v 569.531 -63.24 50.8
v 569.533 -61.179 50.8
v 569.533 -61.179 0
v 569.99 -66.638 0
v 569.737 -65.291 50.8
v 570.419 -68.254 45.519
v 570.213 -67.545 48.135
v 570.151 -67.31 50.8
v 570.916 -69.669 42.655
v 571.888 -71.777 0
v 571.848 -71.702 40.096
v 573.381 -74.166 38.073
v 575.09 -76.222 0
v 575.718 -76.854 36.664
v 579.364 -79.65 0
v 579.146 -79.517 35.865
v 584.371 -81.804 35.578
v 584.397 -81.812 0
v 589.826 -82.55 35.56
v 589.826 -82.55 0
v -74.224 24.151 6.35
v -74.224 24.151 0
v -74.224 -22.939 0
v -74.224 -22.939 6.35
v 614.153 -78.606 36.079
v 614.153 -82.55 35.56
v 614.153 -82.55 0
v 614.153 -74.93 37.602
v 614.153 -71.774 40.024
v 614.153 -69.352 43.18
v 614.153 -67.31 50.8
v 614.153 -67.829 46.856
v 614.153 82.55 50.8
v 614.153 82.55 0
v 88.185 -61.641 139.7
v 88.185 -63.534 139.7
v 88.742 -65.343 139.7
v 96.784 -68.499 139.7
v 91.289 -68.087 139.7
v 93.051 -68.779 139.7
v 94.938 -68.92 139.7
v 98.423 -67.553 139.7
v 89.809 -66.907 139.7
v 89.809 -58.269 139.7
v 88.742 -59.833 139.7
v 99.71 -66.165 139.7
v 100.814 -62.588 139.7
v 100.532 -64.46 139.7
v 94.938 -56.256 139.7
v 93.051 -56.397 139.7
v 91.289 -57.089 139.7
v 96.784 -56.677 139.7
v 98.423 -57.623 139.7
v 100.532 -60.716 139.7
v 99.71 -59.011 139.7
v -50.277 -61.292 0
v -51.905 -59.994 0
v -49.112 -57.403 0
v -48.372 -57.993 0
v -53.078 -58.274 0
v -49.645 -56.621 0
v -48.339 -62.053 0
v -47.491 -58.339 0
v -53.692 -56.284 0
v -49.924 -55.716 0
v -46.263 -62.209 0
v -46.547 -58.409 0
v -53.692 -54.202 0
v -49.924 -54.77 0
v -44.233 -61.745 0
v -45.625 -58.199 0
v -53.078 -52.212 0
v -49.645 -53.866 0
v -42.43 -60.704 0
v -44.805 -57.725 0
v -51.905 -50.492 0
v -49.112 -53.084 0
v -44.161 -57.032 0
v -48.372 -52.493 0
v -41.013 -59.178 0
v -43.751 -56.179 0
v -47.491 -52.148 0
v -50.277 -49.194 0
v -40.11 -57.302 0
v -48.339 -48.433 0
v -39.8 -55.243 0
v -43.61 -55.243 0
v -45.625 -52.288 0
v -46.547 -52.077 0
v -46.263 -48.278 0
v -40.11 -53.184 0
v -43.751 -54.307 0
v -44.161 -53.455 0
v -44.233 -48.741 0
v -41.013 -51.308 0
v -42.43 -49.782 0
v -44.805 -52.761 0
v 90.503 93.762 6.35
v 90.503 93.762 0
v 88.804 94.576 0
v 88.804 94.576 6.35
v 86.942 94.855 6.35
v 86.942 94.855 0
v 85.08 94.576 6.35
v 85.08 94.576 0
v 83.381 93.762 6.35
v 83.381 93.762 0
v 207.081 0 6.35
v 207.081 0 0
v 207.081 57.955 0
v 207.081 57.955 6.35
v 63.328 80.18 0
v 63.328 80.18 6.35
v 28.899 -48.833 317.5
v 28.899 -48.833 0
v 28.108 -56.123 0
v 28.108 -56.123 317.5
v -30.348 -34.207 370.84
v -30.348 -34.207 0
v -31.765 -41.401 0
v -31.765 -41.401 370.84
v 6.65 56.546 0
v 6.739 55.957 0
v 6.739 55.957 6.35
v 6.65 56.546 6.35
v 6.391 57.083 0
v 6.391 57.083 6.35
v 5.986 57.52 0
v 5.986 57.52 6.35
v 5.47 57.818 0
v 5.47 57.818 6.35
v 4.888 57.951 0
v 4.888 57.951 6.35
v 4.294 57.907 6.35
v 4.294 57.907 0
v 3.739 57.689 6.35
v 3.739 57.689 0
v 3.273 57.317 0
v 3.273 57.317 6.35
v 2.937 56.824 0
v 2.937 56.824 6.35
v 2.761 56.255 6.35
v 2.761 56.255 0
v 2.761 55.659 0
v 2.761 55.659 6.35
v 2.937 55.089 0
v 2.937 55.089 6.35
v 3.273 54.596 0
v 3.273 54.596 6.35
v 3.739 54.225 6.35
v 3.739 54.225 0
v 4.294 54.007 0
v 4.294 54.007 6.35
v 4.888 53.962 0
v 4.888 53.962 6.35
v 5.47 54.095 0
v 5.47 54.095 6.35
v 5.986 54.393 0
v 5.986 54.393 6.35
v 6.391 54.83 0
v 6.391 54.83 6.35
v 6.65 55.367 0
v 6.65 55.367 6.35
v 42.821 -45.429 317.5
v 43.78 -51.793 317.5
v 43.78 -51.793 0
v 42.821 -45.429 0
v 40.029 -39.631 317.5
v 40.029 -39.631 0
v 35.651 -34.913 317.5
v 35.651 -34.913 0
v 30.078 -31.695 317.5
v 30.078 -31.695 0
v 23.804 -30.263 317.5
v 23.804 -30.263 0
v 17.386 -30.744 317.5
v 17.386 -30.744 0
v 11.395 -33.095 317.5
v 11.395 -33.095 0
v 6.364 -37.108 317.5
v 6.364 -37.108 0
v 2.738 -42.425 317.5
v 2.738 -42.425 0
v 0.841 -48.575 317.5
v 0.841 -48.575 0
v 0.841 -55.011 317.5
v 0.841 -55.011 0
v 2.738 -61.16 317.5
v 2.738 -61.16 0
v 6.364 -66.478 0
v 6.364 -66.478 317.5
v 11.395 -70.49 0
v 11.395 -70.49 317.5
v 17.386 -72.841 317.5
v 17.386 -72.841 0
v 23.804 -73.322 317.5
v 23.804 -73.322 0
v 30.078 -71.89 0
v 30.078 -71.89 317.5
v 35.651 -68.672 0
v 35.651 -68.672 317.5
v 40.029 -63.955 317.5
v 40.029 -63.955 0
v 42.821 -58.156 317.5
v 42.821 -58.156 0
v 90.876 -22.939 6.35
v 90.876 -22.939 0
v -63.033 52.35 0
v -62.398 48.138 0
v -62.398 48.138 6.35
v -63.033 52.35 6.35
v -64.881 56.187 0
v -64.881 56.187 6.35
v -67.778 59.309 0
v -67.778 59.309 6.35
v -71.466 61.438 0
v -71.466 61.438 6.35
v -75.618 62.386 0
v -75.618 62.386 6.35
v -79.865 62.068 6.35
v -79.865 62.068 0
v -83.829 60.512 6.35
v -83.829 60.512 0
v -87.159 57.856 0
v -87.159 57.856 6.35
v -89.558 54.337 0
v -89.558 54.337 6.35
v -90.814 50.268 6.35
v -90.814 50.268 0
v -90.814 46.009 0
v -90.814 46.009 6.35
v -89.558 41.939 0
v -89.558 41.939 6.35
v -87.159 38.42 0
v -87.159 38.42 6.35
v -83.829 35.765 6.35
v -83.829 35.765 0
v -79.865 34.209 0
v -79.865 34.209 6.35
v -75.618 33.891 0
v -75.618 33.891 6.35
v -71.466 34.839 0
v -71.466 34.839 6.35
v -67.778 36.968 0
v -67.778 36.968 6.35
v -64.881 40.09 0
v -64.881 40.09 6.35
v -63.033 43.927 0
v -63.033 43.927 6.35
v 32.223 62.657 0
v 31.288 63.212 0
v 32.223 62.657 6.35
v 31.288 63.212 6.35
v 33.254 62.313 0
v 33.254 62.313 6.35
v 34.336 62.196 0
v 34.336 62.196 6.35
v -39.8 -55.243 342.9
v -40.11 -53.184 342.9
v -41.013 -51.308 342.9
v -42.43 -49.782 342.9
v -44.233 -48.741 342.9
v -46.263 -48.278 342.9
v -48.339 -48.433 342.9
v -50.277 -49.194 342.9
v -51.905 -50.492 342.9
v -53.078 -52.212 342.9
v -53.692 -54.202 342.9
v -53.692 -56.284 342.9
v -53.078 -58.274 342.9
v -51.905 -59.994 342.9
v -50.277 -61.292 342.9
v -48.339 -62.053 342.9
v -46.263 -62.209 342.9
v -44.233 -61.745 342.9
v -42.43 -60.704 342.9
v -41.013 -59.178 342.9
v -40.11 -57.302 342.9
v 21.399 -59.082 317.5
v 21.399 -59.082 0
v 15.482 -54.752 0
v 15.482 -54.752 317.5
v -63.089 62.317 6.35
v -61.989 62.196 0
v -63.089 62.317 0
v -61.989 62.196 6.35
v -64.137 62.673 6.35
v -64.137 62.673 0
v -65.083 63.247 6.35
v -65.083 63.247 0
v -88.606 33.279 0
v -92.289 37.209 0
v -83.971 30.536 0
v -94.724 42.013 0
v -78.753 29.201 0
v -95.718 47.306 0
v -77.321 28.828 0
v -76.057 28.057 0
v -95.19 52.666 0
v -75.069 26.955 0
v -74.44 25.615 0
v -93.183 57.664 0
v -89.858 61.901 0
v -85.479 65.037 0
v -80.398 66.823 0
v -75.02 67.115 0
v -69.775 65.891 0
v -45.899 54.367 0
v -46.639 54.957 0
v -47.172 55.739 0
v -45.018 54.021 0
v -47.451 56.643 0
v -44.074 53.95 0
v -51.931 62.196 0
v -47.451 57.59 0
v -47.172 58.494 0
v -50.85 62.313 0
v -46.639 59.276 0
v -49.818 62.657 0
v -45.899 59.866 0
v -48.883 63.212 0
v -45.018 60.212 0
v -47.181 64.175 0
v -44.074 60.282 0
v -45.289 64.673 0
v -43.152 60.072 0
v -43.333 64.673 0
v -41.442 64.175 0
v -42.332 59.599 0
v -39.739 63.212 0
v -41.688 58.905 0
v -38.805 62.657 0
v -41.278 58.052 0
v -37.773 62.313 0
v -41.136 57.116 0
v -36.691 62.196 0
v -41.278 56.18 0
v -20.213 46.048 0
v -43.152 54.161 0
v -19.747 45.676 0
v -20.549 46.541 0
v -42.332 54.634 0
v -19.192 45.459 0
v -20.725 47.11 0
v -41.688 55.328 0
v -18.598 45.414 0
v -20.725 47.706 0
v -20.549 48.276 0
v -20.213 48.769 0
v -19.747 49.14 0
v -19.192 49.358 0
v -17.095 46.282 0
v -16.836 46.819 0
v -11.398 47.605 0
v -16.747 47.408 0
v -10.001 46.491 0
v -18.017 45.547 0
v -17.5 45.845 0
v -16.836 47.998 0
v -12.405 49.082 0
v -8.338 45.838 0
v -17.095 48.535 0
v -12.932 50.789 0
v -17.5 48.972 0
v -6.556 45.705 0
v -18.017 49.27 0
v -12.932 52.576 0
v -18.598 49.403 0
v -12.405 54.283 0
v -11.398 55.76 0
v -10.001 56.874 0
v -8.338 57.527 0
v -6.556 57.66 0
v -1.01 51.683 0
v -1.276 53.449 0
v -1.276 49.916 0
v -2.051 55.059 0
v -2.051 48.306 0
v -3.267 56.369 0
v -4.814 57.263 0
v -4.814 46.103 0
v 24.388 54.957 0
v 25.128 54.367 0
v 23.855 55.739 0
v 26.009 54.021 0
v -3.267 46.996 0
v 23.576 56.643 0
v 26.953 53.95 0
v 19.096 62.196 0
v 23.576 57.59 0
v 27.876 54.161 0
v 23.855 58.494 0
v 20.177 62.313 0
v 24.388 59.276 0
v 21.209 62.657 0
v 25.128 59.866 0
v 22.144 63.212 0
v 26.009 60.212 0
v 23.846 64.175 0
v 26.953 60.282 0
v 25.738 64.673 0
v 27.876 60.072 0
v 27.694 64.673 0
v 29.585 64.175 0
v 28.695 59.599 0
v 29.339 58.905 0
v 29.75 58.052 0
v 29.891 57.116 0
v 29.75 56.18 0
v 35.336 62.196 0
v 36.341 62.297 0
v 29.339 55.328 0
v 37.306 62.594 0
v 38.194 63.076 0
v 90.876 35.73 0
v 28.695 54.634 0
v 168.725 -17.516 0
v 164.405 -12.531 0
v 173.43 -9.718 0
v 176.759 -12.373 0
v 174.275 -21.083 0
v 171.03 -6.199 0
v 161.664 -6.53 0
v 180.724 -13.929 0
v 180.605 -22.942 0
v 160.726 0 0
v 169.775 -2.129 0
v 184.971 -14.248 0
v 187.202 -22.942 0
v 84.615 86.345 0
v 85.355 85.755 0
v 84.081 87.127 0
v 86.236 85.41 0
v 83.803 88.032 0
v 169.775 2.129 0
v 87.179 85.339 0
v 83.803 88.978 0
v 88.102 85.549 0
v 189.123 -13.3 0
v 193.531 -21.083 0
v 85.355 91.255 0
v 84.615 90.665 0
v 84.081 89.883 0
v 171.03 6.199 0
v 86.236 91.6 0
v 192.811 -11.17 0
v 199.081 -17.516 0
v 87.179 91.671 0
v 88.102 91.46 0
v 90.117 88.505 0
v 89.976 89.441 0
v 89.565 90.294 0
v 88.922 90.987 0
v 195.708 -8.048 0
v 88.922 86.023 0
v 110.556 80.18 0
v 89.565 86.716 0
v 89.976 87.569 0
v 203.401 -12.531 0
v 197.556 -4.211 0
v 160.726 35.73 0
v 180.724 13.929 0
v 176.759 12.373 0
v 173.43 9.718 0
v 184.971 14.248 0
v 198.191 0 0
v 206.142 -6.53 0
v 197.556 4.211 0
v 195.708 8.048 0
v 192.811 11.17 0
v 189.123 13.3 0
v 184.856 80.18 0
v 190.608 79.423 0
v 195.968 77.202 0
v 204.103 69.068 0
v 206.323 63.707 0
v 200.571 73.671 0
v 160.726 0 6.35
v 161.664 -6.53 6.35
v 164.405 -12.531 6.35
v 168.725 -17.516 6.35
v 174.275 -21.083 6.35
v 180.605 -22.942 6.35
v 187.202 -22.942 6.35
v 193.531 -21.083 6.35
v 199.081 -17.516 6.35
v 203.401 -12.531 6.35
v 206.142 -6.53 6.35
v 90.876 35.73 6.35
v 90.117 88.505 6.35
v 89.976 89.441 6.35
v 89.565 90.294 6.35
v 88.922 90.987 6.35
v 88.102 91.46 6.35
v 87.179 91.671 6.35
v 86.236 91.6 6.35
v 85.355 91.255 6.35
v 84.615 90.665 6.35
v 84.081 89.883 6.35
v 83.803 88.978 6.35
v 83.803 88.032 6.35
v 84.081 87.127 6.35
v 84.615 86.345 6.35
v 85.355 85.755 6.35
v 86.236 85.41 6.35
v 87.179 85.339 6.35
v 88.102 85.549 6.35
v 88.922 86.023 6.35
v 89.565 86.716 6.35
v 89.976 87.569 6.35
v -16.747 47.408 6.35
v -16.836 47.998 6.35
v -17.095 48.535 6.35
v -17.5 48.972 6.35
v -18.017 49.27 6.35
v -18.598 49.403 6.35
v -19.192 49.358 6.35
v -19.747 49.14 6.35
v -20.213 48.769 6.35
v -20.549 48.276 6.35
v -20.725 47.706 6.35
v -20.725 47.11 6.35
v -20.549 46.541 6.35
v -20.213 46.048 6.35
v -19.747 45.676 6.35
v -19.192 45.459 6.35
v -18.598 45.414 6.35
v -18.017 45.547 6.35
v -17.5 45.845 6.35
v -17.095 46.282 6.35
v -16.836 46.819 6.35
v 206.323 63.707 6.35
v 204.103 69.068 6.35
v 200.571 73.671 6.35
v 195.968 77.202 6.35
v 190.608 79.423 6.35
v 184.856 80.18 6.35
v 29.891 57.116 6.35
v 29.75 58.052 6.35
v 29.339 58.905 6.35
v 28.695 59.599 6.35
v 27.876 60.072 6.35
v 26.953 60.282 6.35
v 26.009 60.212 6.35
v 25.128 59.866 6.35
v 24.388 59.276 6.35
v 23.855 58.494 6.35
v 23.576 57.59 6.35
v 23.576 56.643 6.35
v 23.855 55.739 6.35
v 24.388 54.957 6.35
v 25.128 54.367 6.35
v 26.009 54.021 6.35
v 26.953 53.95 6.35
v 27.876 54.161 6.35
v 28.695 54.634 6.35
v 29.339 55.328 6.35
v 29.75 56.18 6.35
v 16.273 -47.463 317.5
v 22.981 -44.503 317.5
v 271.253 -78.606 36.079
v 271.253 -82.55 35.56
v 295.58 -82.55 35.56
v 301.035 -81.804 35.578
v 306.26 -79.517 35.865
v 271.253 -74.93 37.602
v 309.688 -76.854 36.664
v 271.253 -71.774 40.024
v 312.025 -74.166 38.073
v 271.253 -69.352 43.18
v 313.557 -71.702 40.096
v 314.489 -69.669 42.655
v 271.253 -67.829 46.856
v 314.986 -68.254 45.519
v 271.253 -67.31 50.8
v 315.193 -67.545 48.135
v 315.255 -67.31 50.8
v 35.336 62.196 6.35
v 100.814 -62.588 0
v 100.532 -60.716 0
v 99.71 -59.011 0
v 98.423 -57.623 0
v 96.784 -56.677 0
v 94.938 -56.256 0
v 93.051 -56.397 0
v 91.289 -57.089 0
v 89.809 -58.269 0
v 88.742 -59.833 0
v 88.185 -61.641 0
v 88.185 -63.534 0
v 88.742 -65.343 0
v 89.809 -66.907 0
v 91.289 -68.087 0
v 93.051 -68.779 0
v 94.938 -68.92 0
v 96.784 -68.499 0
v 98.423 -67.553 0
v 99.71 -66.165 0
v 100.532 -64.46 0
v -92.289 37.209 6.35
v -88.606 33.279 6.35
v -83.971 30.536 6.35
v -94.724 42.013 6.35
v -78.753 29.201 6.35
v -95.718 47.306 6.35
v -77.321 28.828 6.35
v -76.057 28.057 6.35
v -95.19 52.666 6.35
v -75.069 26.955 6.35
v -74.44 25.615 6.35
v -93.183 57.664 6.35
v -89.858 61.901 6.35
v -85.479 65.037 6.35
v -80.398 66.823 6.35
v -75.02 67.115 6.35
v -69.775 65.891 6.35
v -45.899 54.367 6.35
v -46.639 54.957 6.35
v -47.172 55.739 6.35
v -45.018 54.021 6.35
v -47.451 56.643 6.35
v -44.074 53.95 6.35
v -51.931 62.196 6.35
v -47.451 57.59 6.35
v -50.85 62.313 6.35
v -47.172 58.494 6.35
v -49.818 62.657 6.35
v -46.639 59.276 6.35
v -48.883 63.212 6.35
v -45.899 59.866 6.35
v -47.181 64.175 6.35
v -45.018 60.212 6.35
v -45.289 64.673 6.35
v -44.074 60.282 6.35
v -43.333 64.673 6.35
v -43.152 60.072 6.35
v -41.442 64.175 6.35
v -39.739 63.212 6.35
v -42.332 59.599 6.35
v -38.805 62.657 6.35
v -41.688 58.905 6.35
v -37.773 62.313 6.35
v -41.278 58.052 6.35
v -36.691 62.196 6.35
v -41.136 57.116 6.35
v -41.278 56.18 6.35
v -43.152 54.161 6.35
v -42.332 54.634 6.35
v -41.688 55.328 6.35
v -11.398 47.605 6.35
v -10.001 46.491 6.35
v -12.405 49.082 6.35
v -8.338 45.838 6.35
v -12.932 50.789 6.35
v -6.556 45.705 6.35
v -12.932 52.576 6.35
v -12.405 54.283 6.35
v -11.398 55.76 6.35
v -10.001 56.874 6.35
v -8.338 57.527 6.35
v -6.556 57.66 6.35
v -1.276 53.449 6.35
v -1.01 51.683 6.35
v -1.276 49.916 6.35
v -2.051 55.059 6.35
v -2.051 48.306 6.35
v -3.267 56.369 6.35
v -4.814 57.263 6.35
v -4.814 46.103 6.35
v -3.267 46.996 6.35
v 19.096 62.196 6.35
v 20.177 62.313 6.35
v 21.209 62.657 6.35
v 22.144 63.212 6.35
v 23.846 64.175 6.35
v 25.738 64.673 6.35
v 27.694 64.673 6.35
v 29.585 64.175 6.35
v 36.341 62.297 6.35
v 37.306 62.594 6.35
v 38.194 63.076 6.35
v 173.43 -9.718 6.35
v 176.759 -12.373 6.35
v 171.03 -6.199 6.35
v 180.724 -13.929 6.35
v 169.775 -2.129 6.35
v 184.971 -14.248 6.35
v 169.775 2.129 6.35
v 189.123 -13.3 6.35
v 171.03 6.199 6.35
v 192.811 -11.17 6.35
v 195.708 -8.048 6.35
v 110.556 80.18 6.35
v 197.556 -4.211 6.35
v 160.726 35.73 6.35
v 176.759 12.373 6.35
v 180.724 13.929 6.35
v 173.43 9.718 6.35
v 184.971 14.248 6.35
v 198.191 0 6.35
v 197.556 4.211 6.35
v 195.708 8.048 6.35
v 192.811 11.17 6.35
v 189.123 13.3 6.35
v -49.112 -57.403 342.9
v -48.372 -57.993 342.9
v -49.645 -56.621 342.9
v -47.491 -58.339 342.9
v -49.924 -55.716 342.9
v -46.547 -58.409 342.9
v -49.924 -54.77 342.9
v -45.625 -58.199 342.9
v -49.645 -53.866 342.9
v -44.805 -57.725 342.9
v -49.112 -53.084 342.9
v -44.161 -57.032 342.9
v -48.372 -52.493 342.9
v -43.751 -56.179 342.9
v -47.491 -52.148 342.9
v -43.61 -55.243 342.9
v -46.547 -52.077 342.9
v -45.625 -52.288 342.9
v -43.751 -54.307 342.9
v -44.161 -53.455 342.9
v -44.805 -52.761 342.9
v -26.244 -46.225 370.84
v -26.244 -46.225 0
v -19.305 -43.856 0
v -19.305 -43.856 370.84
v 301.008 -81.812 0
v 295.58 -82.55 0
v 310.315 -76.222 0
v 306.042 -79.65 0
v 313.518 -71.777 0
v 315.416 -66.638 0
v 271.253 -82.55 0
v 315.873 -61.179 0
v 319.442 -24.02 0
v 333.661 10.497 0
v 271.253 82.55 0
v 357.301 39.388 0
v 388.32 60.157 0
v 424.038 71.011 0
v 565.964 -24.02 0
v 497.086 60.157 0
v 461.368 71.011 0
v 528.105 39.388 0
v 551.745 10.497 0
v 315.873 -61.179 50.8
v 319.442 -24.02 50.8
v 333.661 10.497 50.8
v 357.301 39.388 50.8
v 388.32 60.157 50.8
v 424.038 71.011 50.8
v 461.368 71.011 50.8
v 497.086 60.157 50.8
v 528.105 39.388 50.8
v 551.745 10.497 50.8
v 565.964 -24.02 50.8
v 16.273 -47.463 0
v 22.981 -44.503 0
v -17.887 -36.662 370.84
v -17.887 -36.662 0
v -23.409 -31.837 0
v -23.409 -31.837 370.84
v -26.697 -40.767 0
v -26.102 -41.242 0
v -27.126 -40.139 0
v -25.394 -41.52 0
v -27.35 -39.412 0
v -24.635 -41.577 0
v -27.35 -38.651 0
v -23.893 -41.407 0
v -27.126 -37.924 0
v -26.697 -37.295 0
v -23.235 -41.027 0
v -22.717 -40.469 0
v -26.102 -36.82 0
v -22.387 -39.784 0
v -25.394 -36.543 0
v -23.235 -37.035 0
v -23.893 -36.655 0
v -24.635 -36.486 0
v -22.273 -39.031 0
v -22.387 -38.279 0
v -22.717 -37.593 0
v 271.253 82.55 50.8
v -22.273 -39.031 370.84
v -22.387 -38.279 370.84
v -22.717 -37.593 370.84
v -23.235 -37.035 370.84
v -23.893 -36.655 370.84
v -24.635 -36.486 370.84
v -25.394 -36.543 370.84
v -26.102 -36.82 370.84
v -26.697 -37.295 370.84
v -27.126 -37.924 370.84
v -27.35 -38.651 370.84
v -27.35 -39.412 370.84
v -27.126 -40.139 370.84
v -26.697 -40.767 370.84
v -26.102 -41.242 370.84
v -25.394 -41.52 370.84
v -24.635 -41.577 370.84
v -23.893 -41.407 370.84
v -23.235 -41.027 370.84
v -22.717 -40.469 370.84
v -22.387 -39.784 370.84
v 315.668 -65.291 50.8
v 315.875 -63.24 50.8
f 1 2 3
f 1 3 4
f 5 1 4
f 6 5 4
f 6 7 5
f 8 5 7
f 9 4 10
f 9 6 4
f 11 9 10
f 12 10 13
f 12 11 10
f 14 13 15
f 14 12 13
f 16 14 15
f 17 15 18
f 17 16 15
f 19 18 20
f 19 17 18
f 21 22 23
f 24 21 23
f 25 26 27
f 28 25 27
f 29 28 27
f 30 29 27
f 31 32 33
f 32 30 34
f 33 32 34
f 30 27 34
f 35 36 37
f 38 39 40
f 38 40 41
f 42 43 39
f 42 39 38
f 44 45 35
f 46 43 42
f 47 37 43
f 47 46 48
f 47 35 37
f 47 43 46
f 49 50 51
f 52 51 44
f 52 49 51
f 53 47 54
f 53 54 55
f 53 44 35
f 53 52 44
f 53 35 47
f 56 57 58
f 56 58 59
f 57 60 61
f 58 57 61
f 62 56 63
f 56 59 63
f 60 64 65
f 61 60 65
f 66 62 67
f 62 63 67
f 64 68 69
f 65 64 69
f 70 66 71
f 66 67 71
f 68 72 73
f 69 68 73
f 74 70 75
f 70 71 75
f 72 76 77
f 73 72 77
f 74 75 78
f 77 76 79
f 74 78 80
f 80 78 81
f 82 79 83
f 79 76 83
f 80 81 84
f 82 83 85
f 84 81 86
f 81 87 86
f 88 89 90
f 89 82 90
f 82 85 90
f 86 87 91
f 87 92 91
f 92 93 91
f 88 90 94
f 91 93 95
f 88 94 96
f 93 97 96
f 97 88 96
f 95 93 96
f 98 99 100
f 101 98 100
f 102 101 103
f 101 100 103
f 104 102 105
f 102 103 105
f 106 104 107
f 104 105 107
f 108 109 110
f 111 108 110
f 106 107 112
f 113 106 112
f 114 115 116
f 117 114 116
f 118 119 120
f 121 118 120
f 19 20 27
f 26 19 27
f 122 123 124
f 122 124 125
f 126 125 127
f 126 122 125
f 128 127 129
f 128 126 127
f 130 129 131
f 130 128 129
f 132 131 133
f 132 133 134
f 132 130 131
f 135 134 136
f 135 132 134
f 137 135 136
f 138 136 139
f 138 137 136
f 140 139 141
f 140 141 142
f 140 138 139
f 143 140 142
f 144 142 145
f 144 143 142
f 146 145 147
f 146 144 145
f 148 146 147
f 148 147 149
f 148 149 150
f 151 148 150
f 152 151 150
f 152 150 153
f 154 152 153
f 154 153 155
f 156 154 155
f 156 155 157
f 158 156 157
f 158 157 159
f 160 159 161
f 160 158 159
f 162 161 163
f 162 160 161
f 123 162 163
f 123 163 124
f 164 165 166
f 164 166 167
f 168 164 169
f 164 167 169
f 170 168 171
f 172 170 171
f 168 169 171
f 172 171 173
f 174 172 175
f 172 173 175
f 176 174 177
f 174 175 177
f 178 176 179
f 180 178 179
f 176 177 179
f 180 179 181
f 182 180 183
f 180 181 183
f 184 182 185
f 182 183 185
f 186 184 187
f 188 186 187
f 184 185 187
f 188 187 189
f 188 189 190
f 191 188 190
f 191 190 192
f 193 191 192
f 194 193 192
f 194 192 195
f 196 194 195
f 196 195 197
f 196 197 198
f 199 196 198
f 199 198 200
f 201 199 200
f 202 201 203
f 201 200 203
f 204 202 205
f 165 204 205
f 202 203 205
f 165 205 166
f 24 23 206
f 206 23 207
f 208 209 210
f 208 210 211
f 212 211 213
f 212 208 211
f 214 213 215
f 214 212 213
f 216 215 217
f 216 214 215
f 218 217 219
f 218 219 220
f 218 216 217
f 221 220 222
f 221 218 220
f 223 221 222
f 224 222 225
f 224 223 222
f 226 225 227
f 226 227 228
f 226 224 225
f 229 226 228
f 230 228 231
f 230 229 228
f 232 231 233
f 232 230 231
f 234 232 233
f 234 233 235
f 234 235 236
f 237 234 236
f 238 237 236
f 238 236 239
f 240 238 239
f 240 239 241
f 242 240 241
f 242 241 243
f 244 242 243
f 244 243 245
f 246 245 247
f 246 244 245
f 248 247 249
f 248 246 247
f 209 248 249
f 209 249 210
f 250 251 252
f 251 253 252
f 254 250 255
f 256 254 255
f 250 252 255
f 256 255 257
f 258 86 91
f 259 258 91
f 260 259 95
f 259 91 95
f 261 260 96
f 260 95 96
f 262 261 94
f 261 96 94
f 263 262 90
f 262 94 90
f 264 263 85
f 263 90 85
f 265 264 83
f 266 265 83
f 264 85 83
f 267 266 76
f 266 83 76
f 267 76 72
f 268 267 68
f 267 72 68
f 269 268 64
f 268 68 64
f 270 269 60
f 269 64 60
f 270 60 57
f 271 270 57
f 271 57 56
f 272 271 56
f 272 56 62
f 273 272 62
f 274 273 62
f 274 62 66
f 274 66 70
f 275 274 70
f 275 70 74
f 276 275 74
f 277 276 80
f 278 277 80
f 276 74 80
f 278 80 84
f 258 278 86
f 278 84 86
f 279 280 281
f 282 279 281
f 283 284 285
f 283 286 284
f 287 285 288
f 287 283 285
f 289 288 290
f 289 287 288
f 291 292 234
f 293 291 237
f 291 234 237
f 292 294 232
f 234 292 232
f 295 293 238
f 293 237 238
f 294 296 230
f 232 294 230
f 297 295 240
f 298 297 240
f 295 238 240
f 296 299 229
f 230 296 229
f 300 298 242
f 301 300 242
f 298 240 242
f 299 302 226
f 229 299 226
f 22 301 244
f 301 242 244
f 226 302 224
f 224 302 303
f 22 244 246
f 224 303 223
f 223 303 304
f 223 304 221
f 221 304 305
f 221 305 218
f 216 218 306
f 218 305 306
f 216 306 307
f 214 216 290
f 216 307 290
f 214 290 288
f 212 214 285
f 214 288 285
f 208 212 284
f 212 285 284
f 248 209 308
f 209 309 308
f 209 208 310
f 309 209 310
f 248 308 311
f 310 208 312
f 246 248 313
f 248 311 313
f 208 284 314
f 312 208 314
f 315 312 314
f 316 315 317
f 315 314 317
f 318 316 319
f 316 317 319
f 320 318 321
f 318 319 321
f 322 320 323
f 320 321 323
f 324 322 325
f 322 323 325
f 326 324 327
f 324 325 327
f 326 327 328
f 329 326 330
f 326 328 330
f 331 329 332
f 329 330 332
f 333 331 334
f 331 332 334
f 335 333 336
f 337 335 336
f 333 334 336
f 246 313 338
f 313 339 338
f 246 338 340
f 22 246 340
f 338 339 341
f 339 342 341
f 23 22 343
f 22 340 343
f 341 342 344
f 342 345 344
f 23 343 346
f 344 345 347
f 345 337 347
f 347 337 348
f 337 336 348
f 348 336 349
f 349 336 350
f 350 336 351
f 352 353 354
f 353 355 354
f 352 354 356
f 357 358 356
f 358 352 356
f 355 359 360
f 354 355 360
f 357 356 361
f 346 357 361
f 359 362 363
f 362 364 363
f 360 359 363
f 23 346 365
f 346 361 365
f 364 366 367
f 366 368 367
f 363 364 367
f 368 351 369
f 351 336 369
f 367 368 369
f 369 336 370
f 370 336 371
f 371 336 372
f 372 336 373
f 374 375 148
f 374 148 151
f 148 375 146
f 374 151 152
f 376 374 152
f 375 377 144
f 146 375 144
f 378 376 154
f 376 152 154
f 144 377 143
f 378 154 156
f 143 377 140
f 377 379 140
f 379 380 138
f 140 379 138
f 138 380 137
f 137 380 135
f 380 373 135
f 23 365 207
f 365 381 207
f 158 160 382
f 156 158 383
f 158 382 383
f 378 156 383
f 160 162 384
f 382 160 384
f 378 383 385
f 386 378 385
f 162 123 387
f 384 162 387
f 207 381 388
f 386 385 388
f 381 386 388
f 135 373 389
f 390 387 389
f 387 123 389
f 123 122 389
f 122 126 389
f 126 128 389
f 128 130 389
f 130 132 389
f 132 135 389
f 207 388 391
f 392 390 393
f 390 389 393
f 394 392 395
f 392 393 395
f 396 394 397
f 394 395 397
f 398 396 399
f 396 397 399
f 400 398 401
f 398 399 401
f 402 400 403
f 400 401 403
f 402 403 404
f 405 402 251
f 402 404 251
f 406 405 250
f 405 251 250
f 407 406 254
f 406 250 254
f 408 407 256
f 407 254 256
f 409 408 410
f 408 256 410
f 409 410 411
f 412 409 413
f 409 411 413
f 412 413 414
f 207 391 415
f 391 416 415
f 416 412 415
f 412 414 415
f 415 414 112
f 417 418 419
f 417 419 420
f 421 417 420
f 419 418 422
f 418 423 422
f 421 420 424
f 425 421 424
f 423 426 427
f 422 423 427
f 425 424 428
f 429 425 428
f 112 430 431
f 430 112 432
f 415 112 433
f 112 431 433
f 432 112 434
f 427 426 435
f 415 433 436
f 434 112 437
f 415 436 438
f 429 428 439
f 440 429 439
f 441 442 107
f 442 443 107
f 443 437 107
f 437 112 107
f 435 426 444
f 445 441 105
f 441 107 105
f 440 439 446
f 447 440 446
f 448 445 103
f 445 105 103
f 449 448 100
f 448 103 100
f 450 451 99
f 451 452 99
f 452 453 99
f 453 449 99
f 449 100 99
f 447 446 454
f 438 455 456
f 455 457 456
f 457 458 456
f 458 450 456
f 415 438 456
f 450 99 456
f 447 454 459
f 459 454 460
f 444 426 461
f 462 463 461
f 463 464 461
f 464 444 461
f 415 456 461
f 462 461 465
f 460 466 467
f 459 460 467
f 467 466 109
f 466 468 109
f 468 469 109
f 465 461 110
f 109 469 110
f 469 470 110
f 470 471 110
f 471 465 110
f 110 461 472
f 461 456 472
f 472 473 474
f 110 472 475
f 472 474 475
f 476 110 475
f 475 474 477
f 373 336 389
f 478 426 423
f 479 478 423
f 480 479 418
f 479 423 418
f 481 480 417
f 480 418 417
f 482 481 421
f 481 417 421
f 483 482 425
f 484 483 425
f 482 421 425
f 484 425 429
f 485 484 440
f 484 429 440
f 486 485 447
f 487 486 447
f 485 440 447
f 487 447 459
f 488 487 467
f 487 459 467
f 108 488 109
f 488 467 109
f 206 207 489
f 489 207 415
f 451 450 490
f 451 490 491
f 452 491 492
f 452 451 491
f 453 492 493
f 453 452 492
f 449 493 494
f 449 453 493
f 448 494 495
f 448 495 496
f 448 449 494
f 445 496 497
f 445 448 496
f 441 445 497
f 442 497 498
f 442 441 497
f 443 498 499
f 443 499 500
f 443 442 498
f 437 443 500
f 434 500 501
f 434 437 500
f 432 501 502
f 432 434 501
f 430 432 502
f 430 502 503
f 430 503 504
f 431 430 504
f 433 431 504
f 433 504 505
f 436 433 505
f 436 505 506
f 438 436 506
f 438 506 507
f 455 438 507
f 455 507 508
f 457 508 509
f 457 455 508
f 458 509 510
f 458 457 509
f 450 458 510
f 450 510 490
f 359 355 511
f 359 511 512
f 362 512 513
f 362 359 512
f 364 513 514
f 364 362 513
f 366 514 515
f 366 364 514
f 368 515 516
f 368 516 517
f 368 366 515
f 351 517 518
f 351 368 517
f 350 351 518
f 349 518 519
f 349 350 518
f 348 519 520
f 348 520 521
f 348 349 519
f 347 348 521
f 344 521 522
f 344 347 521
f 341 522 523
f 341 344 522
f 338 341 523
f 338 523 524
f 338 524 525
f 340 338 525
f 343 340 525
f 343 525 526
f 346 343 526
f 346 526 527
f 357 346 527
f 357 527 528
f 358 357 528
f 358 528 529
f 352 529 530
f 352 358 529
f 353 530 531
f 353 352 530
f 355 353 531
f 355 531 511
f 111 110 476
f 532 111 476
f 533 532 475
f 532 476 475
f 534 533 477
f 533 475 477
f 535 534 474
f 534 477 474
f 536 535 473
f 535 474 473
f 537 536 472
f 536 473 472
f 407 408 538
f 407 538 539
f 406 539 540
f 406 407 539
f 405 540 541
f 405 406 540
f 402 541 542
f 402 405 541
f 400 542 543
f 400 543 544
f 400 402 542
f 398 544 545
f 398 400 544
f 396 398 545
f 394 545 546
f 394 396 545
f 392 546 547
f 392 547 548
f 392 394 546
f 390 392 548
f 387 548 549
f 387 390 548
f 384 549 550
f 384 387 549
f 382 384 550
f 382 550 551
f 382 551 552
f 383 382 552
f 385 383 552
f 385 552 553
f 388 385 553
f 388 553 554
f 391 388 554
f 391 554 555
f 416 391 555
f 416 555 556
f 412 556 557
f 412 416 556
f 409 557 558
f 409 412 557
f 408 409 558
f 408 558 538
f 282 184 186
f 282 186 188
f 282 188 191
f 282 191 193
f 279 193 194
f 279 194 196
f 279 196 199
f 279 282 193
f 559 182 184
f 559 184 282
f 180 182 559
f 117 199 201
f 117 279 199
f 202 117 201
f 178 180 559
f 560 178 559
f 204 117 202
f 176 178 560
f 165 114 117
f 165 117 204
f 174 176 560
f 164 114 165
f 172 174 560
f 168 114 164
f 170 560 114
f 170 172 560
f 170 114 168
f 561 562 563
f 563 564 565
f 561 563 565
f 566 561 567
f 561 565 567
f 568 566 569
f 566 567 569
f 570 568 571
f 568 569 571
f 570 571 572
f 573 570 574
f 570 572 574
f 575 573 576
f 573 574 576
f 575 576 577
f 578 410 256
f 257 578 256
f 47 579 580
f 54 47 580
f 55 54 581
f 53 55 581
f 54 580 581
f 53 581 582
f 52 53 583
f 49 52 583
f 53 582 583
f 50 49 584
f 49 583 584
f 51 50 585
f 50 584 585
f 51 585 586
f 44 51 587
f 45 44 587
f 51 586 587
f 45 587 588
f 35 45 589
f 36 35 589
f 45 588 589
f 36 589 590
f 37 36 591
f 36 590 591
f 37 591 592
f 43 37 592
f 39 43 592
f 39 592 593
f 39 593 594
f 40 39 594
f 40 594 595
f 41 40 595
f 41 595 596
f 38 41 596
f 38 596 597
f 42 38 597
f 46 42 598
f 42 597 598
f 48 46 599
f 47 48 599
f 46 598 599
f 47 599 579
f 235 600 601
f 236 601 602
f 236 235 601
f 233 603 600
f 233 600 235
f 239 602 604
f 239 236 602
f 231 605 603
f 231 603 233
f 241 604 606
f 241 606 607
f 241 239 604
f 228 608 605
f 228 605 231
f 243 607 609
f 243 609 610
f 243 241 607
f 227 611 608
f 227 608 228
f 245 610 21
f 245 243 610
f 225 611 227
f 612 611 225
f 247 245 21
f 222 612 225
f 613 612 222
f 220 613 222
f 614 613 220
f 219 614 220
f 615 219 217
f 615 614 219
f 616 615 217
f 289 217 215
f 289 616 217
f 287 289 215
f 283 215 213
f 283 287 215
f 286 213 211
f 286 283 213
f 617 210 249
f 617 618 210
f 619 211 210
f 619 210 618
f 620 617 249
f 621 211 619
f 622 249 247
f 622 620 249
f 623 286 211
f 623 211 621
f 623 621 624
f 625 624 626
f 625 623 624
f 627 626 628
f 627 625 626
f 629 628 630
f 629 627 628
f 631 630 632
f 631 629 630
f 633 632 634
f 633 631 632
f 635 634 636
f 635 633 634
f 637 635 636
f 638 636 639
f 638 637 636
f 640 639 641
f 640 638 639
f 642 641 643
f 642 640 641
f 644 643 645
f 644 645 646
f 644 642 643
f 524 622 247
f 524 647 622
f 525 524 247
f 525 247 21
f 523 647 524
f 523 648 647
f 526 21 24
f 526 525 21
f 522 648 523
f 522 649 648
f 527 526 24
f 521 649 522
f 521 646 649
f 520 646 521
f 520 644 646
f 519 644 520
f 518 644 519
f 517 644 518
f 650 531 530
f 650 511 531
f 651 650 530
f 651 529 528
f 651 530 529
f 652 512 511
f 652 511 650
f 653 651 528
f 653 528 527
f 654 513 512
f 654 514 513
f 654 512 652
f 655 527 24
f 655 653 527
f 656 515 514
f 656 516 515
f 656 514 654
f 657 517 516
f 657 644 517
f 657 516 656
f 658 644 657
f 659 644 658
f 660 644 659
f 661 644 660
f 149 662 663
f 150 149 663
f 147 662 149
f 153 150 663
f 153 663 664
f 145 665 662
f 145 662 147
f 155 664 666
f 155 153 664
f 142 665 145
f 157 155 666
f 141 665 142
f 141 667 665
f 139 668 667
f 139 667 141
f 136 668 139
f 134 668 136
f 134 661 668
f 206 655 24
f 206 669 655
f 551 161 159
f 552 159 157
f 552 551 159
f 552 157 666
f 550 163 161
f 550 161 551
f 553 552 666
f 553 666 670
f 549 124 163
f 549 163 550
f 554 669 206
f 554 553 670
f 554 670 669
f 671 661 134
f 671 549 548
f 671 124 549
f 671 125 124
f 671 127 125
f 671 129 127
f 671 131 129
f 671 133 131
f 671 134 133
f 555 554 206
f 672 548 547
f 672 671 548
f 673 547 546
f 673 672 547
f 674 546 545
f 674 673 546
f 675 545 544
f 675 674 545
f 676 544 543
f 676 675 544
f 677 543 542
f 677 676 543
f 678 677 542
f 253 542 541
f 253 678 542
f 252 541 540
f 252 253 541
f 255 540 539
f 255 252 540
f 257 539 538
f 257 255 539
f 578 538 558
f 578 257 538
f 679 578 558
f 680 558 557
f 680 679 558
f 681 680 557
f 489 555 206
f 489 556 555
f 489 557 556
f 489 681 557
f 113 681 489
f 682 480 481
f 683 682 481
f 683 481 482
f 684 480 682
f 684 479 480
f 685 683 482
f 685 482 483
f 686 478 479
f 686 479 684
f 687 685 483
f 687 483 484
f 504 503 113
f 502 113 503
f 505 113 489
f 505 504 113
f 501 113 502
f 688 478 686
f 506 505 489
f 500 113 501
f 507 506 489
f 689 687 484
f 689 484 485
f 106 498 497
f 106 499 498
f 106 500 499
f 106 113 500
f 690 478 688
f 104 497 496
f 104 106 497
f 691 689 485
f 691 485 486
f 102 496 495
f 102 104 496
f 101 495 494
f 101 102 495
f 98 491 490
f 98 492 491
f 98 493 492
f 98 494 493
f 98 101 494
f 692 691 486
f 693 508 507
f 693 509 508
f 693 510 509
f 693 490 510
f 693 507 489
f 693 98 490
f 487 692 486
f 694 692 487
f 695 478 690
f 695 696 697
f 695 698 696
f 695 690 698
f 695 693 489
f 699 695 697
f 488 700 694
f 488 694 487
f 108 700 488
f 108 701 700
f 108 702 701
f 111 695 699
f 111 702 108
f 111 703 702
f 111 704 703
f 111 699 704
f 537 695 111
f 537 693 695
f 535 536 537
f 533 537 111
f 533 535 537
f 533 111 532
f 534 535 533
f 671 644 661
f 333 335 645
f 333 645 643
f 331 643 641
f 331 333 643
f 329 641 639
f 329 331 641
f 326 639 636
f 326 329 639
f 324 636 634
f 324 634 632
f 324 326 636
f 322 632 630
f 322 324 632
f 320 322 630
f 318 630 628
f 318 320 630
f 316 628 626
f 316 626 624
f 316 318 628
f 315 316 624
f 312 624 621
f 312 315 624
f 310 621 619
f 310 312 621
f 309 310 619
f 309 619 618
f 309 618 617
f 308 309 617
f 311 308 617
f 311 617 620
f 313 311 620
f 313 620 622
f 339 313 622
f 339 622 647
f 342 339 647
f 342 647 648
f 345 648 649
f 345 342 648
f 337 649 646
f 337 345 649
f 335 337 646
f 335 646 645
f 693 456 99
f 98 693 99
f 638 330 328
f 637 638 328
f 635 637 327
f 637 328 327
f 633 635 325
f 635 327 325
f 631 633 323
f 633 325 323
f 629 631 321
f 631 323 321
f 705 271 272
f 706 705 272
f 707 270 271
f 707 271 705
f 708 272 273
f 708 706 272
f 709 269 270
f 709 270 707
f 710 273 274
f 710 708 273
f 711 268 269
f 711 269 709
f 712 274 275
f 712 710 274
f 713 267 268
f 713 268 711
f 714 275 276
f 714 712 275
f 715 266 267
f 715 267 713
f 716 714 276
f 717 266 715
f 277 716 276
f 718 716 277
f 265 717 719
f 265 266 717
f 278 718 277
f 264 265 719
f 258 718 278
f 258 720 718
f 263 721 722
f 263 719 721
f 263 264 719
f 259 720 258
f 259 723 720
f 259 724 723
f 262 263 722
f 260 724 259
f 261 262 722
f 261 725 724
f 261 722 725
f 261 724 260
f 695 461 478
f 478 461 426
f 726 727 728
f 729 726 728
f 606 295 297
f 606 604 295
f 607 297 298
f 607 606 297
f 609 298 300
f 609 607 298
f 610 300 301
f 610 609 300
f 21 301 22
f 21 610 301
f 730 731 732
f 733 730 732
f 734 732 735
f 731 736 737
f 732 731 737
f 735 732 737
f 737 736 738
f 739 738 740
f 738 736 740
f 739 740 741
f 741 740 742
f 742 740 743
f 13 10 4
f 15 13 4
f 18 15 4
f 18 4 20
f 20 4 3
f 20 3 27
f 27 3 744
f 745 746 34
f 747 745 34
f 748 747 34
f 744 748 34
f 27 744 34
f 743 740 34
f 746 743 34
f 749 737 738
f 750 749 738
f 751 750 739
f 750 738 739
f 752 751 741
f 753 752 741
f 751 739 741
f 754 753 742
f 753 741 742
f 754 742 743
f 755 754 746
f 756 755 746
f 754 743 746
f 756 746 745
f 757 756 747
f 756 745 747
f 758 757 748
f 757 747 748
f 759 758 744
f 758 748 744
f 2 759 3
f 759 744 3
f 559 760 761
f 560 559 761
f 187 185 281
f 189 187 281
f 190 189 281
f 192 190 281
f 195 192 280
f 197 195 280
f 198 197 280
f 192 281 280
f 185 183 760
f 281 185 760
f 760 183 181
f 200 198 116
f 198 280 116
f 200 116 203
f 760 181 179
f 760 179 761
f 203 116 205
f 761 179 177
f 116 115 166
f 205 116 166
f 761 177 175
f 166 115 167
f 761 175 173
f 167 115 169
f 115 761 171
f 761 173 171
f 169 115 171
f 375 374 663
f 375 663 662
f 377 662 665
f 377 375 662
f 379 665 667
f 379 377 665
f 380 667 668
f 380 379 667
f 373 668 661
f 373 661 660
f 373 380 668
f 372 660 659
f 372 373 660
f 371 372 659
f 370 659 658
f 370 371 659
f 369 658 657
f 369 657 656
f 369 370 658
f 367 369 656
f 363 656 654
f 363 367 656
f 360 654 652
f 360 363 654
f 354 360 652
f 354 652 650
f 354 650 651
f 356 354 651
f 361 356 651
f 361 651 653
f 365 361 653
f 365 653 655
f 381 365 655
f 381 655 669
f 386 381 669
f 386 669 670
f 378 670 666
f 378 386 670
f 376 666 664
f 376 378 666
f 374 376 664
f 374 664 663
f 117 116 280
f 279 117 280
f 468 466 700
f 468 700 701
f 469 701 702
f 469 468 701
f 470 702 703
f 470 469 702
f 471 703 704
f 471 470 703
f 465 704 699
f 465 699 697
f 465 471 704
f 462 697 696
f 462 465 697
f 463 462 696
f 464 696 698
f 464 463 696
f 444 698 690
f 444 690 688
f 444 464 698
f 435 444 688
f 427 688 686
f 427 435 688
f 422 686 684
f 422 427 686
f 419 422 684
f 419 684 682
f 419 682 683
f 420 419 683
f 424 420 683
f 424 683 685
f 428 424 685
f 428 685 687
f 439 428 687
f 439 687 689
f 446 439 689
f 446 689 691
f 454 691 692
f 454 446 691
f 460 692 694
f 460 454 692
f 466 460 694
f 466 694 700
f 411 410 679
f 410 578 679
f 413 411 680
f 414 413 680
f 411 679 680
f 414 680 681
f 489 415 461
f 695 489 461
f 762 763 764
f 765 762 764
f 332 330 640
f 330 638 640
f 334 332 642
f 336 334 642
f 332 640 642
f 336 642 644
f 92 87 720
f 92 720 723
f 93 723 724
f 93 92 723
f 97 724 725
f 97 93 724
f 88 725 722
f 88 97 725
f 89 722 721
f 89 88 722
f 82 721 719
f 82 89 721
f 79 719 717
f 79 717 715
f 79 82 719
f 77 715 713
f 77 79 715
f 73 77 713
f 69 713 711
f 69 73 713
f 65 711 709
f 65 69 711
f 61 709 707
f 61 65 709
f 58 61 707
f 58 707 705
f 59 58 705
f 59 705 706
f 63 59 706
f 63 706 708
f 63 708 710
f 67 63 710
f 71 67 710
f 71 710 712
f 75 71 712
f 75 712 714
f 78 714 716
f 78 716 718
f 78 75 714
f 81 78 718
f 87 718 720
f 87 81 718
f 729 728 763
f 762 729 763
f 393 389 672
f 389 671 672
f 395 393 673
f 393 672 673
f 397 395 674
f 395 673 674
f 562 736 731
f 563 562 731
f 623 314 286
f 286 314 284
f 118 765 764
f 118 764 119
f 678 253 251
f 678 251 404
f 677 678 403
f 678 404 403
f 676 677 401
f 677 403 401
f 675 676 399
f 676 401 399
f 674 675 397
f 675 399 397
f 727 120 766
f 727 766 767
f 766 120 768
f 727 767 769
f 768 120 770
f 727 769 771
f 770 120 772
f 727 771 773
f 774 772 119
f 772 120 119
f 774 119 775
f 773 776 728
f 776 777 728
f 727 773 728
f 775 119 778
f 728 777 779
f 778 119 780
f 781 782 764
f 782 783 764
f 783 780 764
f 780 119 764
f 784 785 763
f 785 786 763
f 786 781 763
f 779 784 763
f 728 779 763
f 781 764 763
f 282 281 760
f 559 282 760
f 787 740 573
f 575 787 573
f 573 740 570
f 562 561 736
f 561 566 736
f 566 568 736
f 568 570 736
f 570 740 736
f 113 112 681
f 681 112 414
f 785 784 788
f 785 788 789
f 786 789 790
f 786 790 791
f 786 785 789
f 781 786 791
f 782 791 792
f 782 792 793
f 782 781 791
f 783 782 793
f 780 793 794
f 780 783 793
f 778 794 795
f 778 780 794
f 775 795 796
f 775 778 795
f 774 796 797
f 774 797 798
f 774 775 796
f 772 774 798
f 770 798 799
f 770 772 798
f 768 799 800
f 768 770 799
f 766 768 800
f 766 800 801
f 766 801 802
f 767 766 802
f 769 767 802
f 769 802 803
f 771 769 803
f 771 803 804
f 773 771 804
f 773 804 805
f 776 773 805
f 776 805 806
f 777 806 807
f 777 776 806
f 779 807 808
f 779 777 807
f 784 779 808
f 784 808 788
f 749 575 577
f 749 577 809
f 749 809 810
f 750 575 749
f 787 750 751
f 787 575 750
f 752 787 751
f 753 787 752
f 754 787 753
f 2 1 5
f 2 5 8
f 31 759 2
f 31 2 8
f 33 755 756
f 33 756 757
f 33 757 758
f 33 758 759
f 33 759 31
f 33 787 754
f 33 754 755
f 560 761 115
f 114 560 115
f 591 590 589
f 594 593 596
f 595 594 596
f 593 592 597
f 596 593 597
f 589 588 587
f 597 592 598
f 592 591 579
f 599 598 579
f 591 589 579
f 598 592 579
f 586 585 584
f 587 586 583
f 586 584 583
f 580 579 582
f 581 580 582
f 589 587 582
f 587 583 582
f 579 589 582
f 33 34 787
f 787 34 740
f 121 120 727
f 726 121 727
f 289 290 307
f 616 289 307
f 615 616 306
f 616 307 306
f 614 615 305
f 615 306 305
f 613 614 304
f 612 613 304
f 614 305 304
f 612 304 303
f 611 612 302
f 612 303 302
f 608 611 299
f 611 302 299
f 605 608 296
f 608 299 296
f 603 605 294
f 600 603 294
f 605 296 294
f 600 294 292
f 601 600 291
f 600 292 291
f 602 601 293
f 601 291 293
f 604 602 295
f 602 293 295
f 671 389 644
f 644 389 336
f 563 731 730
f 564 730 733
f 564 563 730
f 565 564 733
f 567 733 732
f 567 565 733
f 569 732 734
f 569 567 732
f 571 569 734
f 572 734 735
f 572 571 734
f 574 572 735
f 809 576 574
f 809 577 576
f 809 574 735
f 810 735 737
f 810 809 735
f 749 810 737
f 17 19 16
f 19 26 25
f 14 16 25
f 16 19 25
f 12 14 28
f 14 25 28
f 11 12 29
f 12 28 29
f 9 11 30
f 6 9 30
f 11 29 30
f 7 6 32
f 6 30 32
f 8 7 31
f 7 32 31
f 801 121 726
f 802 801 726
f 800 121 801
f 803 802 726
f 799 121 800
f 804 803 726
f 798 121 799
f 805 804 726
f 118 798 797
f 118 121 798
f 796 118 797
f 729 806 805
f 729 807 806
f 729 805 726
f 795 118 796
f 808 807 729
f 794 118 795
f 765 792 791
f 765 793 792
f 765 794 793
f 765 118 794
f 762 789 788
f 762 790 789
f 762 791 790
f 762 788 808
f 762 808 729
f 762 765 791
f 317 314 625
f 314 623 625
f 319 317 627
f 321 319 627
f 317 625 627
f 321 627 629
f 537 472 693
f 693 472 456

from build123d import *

# Parameters (mm, degrees)
F1_R      = 14.2875
F1_R_2    = 3.175
F1_R_3    = 2
F1_R_4    = 5.9944
F2_DEPTH  = 6.35
F3_R      = 6.985
F3_R_2    = 3.175
F4_DEPTH  = 342.9
F5_R      = 2.5527
F6_DEPTH  = 370.84
F7_R      = 21.59
F8_DEPTH  = 317.5
F10_DEPTH = 50.8
F11_R     = 20.32
F13_DEPTH = 342.9
F14_R     = 6.35
F15_DEPTH = 139.7
F16_R     = 5.08


with BuildPart() as f2:
    # F1 (on Top) → F2 (new body)
    with BuildSketch(Plane.XY):
        with BuildLine():
            Line((-49.9910764957, 62.1962980512), (-63.8297284243, 62.1962980512))
            ThreePointArc((-63.8297284243, 62.1962980512), (-94.8530671804, 53.8699299137), (-74.2244912377, 29.2480329821))
            Line((-74.2244912377, 29.2480329821), (-74.2244912377, -22.9390313281))
            Line((-74.2244912377, -22.9390313281), (90.8755087623, -22.9390313281))
            Line((90.8755087623, -22.9390313281), (90.8755087623, 35.7300707037))
            Line((90.8755087623, 35.7300707037), (160.7255087623, 35.7300707037))
            Line((160.7255087623, 35.7300707037), (160.7255087623, 0))
            ThreePointArc((160.7255087623, 0), (183.9030087623, -23.1775), (207.0805087623, 0))
            Line((207.0805087623, 0), (207.0805087623, 57.9550707037))
            ThreePointArc((207.0805087623, 57.9550707037), (200.5709569742, 73.6705189156), (184.8555087623, 80.1800707037))
            Line((184.8555087623, 80.1800707037), (110.5558629778, 80.1800707037))
            Line((110.5558629778, 80.1800707037), (90.5031153064, 93.7624556725))
            ThreePointArc((90.5031153064, 93.7624556725), (86.9420412896, 94.8549608464), (83.3809672727, 93.7624556725))
            Line((83.3809672727, 93.7624556725), (63.3282196013, 80.1800707037))
            Line((63.3282196013, 80.1800707037), (36.9001390489, 62.1962980512))
            Line((36.9001390489, 62.1962980512), (32.3953867519, 62.1962980512))
            ThreePointArc((32.3953867519, 62.1962980512), (26.7157740891, 64.7362980512), (21.0361614262, 62.1962980512))
            Line((21.0361614262, 62.1962980512), (-38.63185117, 62.1962980512))
            ThreePointArc((-38.63185117, 62.1962980512), (-44.3114638329, 64.7362980512), (-49.9910764957, 62.1962980512))
        make_face()
        with Locations((183.9030087623, 0)):
            Circle(F1_R, mode=Mode.SUBTRACT)
        with Locations((-76.6857422854, 48.1383676345)):
            Circle(F1_R, mode=Mode.SUBTRACT)
        with Locations((-44.3114638329, 57.1162980512)):
            Circle(F1_R_2, mode=Mode.SUBTRACT)
        with Locations((-18.747377767, 47.4084117594)):
            Circle(F1_R_3, mode=Mode.SUBTRACT)
        with Locations((-7.0042270236, 51.6825690866)):
            Circle(F1_R_4, mode=Mode.SUBTRACT)
        with Locations((4.7389237199, 55.9567264137)):
            Circle(F1_R_3, mode=Mode.SUBTRACT)
        with Locations((26.7157740891, 57.1162980512)):
            Circle(F1_R_2, mode=Mode.SUBTRACT)
        with Locations((86.9420412896, 88.5049608464)):
            Circle(F1_R_2, mode=Mode.SUBTRACT)
    extrude(amount=F2_DEPTH)

    # F16
    f16_edges = [f2.edges().sort_by_distance(p)[0] for p in [
        (-38.631851, 62.196298, 3.175),
        (21.036161, 62.196298, 3.175),
        (32.395387, 62.196298, 3.175),
        (36.900139, 62.196298, 3.175),
        (-49.991076, 62.196298, 3.175),
        (-63.829728, 62.196298, 3.175),
        (-74.224491, 29.248033, 3.175),
    ]]
    fillet(f16_edges, radius=F16_R)


with BuildPart() as f4:
    # F3 (on Top) → F4 (new body)
    with BuildSketch(Plane.XY):
        with Locations((-46.784657985, -55.2431158721)):
            Circle(F3_R)
        with Locations((-46.784657985, -55.2431158721)):
            Circle(F3_R_2, mode=Mode.SUBTRACT)
    extrude(amount=F4_DEPTH)


with BuildPart() as f6:
    # F5 (on Top) → F6 (new body)
    with BuildSketch(Plane.XY):
        Polygon((-26.2436224322, -46.2252245101), (-19.3046554622, -43.8558214793), (-17.8871351937, -36.6617982918), (-23.4085818952, -31.8371781352), (-30.3475488653, -34.206581166), (-31.7650691337, -41.4006043535), align=None)
        with Locations((-24.8261021637, -39.0312013227)):
            Circle(F5_R, mode=Mode.SUBTRACT)
    extrude(amount=F6_DEPTH)


with BuildPart() as f8:
    # F7 (on Top) → F8 (new body)
    with BuildSketch(Plane.XY):
        with Locations((22.1902159048, -51.7927211475)):
            Circle(F7_R)
        Polygon((28.8987125921, -48.8330918581), (28.1075783988, -56.1226350552), (21.3990817115, -59.0822643445), (15.4817192176, -54.7523504368), (16.2728534109, -47.4628072397), (22.9813500981, -44.5031779504), align=None, mode=Mode.SUBTRACT)
    extrude(amount=F8_DEPTH)


with BuildPart() as f10:
    # F9 (on Top) → F10 (new body)
    with BuildSketch(Plane.XY):
        with BuildLine():
            Line((614.152808857, 82.55), (271.252808857, 82.55))
            Line((271.252808857, 82.55), (271.252808857, -82.55))
            Line((271.252808857, -82.55), (318.8143251307, -82.55))
            ThreePointArc((318.8143251307, -82.55), (442.702808857, 72.39), (566.5912925833, -82.55))
            Line((566.5912925833, -82.55), (614.152808857, -82.55))
            Line((614.152808857, -82.55), (614.152808857, 82.55))
        make_face()
    extrude(amount=F10_DEPTH)

    # F11
    f11_edges = [f10.edges().sort_by_distance(p)[0] for p in [
        (318.814325, -82.55, 25.4),
        (566.591293, -82.55, 25.4),
    ]]
    fillet(f11_edges, radius=F11_R)

    # F12 (on face) → F13 (cut, through all)
    with BuildSketch(Plane.YZ.offset(614.152808857)):
        with BuildLine():
            Line((-82.55, 50.8), (-82.55, 35.56))
            ThreePointArc((-82.55, 35.56), (-71.7736926547, 40.0236926547), (-67.31, 50.8))
            Line((-67.31, 50.8), (-82.55, 50.8))
        make_face()
    extrude(amount=-F13_DEPTH, mode=Mode.SUBTRACT)


with BuildPart() as f15:
    # F14 (on Top) → F15 (new body)
    with BuildSketch(Plane.XY):
        with Locations((94.4636166096, -62.587916851)):
            Circle(F14_R)
    extrude(amount=F15_DEPTH)


solid = Compound([f2.part, f4.part, f6.part, f8.part, f10.part, f15.part])
